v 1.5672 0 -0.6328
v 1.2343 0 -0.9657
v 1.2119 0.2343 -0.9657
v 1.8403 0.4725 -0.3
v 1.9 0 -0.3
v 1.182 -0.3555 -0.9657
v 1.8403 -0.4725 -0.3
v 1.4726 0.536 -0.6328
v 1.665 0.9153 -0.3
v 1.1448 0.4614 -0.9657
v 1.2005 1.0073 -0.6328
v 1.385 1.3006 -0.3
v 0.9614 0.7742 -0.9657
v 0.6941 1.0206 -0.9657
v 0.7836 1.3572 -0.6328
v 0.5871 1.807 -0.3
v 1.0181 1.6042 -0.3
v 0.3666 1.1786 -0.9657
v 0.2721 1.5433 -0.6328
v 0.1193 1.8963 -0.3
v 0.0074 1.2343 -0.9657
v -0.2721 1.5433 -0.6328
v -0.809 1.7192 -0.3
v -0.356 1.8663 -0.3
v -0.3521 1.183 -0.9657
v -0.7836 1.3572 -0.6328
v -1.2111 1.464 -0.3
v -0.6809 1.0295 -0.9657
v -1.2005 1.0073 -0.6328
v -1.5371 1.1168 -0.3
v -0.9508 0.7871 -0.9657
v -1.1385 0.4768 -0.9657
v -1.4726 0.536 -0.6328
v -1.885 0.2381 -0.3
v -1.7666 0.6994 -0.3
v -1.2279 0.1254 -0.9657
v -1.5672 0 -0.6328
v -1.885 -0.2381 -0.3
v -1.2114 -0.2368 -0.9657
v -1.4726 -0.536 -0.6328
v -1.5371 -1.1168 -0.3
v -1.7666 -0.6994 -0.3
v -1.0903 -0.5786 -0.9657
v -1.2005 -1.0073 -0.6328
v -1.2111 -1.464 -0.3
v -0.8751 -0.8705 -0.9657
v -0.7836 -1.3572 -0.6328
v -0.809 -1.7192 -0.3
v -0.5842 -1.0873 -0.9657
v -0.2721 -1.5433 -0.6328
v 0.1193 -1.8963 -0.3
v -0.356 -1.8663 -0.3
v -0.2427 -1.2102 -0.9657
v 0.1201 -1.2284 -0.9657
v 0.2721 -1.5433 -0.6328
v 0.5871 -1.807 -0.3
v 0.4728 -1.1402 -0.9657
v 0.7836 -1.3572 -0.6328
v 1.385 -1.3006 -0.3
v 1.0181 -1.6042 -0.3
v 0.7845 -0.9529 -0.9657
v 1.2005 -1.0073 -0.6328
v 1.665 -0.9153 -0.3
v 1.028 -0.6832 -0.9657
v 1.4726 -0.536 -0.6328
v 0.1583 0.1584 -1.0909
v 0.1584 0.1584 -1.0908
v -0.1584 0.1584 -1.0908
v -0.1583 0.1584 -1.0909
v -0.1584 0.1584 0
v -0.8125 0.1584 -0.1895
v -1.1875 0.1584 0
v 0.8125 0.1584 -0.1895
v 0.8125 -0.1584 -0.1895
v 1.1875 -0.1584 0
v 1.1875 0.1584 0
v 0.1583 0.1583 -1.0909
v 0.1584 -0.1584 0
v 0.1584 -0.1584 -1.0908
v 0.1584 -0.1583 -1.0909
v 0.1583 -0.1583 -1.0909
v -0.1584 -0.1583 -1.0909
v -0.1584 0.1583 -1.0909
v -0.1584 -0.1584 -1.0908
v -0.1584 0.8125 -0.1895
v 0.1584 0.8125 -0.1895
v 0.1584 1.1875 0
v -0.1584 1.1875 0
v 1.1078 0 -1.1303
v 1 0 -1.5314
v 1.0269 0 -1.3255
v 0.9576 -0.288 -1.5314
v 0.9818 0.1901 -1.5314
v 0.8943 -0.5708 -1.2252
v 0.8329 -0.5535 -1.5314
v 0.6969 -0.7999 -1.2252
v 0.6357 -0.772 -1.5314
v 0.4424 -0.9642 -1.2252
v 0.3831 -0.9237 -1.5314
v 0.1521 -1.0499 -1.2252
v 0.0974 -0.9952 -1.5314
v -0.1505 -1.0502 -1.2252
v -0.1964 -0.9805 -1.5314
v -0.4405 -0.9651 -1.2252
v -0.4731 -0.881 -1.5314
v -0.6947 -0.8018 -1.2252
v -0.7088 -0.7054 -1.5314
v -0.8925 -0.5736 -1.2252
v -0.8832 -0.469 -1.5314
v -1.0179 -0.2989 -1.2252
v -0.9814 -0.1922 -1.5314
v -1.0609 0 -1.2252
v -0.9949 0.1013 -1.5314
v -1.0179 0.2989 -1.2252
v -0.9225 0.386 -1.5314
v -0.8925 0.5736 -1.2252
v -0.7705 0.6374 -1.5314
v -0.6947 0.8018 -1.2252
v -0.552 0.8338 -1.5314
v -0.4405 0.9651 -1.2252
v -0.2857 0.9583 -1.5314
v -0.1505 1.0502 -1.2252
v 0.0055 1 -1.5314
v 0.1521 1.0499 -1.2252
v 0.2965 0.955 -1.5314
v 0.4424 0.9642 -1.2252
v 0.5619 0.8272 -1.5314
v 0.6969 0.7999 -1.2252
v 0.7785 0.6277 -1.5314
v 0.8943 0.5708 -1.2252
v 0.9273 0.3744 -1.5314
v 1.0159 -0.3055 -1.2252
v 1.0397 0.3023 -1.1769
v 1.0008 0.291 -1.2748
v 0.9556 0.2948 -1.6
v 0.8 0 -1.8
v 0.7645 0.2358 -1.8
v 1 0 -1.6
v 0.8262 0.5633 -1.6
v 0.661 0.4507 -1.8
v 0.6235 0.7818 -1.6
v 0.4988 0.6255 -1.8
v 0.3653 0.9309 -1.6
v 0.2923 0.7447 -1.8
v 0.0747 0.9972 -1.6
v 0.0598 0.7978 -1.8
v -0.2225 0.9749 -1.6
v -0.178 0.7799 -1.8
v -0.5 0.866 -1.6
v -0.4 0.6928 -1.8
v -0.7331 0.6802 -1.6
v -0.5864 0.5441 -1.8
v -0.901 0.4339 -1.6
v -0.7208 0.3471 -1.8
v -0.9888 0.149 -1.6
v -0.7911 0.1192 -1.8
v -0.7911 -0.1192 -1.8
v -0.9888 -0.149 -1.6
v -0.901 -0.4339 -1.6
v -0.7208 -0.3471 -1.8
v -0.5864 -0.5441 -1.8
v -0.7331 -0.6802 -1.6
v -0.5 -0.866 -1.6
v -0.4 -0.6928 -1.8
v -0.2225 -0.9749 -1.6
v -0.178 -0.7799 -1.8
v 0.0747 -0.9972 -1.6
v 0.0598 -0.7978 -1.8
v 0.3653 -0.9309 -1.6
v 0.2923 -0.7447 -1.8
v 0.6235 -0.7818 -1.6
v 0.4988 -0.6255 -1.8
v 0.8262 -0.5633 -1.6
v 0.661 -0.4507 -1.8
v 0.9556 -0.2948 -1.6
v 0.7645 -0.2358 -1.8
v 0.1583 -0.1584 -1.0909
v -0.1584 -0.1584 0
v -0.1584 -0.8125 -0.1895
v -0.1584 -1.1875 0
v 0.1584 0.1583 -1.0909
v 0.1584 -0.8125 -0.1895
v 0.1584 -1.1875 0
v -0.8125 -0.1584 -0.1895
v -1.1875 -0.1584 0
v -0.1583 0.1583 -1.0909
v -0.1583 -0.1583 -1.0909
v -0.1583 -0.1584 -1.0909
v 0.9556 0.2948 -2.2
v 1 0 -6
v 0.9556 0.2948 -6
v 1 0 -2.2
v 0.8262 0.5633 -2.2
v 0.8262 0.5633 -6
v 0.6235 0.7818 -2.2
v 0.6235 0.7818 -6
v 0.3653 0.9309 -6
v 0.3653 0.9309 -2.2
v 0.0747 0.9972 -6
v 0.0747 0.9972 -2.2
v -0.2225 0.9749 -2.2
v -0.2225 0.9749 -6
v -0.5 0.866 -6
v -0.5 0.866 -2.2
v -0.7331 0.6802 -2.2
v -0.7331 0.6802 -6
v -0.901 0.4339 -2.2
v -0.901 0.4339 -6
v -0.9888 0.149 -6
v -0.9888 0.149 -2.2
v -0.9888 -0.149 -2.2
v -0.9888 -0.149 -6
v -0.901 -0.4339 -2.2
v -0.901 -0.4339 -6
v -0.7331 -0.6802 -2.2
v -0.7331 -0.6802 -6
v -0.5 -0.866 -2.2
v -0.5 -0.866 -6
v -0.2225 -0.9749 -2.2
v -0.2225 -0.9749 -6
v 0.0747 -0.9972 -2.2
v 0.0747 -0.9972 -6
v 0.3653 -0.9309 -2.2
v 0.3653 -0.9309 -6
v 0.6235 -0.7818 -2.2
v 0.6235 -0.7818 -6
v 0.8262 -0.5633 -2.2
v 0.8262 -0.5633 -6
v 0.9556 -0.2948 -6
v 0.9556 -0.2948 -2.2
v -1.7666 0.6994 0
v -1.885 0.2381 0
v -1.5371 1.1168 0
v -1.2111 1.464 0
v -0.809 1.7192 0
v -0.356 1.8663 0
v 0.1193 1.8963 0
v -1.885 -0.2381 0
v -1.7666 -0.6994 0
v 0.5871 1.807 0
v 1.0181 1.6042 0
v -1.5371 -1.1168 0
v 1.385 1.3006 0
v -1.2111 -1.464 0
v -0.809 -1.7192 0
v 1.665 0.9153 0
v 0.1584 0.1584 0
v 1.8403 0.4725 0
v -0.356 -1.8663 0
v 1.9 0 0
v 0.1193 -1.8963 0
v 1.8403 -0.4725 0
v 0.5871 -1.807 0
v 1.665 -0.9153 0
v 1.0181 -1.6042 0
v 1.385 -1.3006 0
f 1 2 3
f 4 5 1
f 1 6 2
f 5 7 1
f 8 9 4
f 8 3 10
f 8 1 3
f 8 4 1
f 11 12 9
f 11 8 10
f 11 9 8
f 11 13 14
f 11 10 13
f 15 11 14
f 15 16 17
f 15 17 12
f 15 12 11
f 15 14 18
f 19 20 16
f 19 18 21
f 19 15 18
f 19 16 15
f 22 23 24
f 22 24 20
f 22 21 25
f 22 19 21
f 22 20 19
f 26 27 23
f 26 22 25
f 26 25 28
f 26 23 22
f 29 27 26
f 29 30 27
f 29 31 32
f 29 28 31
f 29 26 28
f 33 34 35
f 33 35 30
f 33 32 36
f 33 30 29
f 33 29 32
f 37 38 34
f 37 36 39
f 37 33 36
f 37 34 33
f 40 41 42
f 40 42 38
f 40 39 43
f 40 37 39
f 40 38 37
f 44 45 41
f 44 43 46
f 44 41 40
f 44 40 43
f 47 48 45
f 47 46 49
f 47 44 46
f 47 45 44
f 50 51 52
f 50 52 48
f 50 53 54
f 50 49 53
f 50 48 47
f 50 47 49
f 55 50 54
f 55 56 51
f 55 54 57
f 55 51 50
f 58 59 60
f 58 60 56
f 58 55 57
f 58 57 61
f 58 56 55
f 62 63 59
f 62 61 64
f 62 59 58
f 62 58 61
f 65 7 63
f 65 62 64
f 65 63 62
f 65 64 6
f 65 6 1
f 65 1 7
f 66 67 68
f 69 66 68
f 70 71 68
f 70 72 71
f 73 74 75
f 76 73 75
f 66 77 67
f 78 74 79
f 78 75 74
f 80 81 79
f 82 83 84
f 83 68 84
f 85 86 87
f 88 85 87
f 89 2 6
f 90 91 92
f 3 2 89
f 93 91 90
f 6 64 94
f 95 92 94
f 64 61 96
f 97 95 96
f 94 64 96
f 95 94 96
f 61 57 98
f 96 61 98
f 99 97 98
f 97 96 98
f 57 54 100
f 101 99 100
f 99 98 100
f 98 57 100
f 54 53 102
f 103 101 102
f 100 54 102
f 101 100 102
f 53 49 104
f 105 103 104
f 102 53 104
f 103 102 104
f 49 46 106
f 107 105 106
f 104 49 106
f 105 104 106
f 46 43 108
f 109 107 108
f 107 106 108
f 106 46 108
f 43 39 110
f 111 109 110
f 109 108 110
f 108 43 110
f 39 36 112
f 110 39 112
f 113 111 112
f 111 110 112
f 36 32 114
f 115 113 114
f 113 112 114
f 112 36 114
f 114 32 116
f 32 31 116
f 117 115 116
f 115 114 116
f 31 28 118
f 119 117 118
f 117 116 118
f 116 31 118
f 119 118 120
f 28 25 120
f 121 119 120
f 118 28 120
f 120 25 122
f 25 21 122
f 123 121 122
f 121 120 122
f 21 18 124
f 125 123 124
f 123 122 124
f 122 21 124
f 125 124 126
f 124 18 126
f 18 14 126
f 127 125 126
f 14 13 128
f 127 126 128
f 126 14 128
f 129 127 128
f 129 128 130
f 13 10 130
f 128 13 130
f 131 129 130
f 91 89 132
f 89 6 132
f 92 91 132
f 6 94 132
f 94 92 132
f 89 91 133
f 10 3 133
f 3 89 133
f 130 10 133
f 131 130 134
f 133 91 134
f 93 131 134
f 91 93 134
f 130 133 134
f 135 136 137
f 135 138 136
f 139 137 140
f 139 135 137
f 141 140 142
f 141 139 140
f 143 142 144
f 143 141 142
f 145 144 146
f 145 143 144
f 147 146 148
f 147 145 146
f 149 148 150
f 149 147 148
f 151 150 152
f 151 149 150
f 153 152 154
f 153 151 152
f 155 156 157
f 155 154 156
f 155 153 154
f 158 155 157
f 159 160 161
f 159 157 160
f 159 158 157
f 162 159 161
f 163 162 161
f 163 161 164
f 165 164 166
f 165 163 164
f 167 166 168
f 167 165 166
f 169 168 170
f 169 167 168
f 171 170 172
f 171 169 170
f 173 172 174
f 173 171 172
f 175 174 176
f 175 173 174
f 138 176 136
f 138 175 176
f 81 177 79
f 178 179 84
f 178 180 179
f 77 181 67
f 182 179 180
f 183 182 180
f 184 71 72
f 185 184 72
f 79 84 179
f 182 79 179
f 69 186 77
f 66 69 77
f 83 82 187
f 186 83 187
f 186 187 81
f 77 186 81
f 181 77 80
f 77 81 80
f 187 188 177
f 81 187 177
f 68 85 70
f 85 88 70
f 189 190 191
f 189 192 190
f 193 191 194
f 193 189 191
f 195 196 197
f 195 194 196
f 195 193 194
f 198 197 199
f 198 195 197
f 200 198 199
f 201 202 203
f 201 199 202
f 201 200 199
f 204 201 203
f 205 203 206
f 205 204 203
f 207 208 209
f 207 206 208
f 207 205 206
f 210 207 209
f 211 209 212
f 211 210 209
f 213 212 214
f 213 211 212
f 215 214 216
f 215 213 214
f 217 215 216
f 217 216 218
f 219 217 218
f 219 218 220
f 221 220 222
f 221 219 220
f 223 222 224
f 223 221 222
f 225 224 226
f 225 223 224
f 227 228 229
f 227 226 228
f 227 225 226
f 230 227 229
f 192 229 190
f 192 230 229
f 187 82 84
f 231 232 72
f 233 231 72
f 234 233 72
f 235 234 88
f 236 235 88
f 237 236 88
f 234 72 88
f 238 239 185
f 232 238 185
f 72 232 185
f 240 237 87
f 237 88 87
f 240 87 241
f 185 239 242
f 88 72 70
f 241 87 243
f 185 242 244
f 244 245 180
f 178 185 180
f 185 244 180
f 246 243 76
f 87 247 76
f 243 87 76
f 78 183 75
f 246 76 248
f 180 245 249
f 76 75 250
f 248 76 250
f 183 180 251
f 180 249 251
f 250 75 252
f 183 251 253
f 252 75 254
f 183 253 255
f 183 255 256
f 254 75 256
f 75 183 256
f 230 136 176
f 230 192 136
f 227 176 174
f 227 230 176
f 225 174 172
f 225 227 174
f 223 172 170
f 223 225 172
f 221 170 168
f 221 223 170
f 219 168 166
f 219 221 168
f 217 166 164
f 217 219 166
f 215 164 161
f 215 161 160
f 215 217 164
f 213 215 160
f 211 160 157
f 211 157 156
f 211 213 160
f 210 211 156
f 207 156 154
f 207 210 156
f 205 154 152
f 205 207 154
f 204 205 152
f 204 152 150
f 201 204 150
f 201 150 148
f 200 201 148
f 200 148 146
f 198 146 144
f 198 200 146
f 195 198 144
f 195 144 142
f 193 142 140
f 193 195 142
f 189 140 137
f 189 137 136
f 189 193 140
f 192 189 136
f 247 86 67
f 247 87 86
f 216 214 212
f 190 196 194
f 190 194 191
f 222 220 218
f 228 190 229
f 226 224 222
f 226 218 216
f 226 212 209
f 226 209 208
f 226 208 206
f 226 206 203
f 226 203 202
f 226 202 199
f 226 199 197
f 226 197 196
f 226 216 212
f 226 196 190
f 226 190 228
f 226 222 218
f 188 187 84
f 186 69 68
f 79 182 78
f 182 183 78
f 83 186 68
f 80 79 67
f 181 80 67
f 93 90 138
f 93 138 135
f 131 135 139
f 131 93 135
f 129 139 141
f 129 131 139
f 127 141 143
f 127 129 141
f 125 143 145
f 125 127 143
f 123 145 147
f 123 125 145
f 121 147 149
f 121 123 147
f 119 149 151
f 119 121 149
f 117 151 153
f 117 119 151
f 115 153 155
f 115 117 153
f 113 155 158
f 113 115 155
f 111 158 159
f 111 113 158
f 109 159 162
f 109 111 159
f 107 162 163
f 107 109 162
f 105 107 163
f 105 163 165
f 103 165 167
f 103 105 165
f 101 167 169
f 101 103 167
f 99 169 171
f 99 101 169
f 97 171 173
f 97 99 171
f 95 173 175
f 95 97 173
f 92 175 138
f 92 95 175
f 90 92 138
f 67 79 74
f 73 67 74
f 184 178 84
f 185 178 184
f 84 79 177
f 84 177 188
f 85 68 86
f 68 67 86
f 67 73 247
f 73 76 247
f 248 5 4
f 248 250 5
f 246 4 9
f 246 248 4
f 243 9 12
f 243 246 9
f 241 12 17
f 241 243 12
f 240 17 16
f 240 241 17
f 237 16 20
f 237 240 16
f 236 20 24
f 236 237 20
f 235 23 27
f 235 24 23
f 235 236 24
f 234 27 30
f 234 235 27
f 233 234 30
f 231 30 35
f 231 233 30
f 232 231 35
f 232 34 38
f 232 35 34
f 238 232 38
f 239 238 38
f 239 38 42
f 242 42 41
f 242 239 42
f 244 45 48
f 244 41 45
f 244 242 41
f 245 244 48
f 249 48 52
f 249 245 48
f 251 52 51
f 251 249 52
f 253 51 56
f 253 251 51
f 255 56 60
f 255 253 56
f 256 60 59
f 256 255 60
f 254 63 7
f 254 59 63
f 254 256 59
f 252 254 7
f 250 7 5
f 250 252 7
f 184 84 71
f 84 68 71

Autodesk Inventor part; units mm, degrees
ref_plane "YZ Plane" through (0, 0, 0) normal (1, 0, 0) x (0, 1, 0)
sketch "Skizze1" plane through (0, 0, 0) normal (0, 1, 0) x (-1, 0, 0)
  point P0 (0, 0)
sketch "Skizze2" plane through (0, 0, 0) normal (0, 0, 1) x (1, 0, 0)
  point P0 (0, 0)
sketch "Skizze3" plane through (0, 0, 0) normal (0, 0, 1) x (1, 0, 0)
  point P0 (0, 0)
sketch "Skizze4" plane through (0, 0, 0) normal (0, 1, 0) x (-1, 0, 0)
  line L0 (-1.9, 0) -> (0, 0)
  line L1 (-1.9, -0.3) -> (-1.9, 0)
  line L2 (-1, -1.2) -> (-1.9, -0.3)
  line L3 (-1, -1.6) -> (-1, -1.2)
  line L4 (-0.8, -1.8) -> (-1, -1.6)
  line L5 (-1, -2.2) -> (-0.8, -1.8)
  line L6 (-1, -6) -> (-1, -2.2)
  line L7 (0, 0) -> (0, -6)
  line L8 (0, 3.3392) -> (0, -10.7) construction
  line L9 (0, 3.3392) -> (0, -10.7)
  line L10 (0, -13.5078) -> (0, 6.1471) projected
  line L11 (-1, -6) -> (0, -6)
  line L12 (0.38, 0) -> (-2.28, 0) projected
  dimension "d3" = 1.9
  dimension "d5" = 0.4
  dimension "d7" = 0.2
  dimension "d9" = 0.4
  dimension "d11" = 1.2
  dimension "d13" = 135
  dimension "d17" = 0.8
  dimension "d19" = 0
  dimension "d51" = 1
  dimension "d52" = 6
revolve "Drehung1" add sketch "Skizze4" angle 360 about axis through (0, 0, 3.3392) along (0, 0, -1)
sketch "Skizze5" plane through (0, 0, 0) normal (0, 1, 0) x (-1, 0, 0)
  line L0 (-0.95, 0) -> (0, 0)
  line L1 (-0.1583, -1.0909) -> (-0.95, 0)
  line L2 (0, -1.0909) -> (-0.1583, -1.0909)
  line L3 (0, 0) -> (0, -1.0909)
  line L4 (-1, -1.2) -> (1, -1.2) construction
  line L5 (-1.9, 0) -> (1.9, 0) projected
  line L6 (0, -1.44) -> (0, 0.24) projected
  dimension "d22" = 0.95
  dimension "d24" = 0.1583
  dimension "d26" = 1.0909
extrude "Extrusion1" cut sketch "Skizze5" along normal mid plane 0.3167
pattern_circular "Polare Anordnung1" count 4 over 360 about axis through (0, 0, 0) along (0, 0, 1) of "Extrusion1"
sketch "Skizze7" plane through (0, 0, 0) normal (0, 1, 0) x (-1, 0, 0)
  line L0 (0, -0.6) -> (-1.1875, 0)
  line L1 (0, 0) -> (0, -0.6)
  line L2 (-1.1875, 0) -> (0, 0)
  line L3 (-1, -1.2) -> (1, -1.2) construction
  line L4 (0, -1.44) -> (0, 0.24) projected
  line L5 (-1.9, 0) -> (1.9, 0) projected
  dimension "d33" = 1.1875
  dimension "d35" = 0.6
extrude "Extrusion2" cut sketch "Skizze7" along normal mid plane 0.3167
pattern_circular "Polare Anordnung2" count 4 over 360 about axis through (0, 0, 0) along (0, 0, 1) of "Extrusion2"
fillet "Rundung1" radius 0.8 1 edges at (-1, 0, -1.2)
thread "Gewinde1" size "M2x0.4" class "6g" standard "ISO Metric profile" full length
ref_plane "MSC_PF1" through (0, 0, 0) normal (1, 0, 0) x (0, 1, 0)
ref_plane "MSC_PT1" through (0, 0, 0) normal (0, 0, -1) x (-1, 0, 0)
equation "\"d3\" = 0.5 * Dh"
equation "\"d5\" = msp_x"
equation "\"d7\" = ParA"
equation "\"d9\" = msp_x"
equation "\"d11\" = ParK"
equation "\"d17\" = 0.5 * msp_mdtds"
equation "\"d51\" = 0.5 * NND"
equation "\"d52\" = NLG"
equation "\"d22\" = 0.5 * M"
equation "\"d24\" = 0.0833333 * M"
equation "\"d26\" = 0.909091 * ParK"
equation "\"d27\" = 0.166667 * M"
equation "\"d33\" = 0.625 * M"
equation "\"d35\" = 0.5 * ParK"
equation "\"d36\" = 0.166667 * M"
equation "\"d41\" = 2 * msp_x"
equation "\"PTC\" = 0.4"
equation "\"NLG\" = 6"
equation "\"ParK\" = 1.2"
equation "\"NND\" = 2"
equation "\"M\" = 1.9"
equation "\"msp_mdtds\" = NND - PTC"
equation "\"Dh\" = 3.8"
equation "\"msp_x\" = PTC"
equation "\"ParA\" = 0.5 * PTC"
equation "\"r\" = 0.5"
equation "\"THREADDIA\" = NND"
equation "\"TEMPLATE\" = 1.2345"
properties part number "DIN EN ISO 7046-2 H - M2x6 - 8.8 - H1" material "Stahl"
